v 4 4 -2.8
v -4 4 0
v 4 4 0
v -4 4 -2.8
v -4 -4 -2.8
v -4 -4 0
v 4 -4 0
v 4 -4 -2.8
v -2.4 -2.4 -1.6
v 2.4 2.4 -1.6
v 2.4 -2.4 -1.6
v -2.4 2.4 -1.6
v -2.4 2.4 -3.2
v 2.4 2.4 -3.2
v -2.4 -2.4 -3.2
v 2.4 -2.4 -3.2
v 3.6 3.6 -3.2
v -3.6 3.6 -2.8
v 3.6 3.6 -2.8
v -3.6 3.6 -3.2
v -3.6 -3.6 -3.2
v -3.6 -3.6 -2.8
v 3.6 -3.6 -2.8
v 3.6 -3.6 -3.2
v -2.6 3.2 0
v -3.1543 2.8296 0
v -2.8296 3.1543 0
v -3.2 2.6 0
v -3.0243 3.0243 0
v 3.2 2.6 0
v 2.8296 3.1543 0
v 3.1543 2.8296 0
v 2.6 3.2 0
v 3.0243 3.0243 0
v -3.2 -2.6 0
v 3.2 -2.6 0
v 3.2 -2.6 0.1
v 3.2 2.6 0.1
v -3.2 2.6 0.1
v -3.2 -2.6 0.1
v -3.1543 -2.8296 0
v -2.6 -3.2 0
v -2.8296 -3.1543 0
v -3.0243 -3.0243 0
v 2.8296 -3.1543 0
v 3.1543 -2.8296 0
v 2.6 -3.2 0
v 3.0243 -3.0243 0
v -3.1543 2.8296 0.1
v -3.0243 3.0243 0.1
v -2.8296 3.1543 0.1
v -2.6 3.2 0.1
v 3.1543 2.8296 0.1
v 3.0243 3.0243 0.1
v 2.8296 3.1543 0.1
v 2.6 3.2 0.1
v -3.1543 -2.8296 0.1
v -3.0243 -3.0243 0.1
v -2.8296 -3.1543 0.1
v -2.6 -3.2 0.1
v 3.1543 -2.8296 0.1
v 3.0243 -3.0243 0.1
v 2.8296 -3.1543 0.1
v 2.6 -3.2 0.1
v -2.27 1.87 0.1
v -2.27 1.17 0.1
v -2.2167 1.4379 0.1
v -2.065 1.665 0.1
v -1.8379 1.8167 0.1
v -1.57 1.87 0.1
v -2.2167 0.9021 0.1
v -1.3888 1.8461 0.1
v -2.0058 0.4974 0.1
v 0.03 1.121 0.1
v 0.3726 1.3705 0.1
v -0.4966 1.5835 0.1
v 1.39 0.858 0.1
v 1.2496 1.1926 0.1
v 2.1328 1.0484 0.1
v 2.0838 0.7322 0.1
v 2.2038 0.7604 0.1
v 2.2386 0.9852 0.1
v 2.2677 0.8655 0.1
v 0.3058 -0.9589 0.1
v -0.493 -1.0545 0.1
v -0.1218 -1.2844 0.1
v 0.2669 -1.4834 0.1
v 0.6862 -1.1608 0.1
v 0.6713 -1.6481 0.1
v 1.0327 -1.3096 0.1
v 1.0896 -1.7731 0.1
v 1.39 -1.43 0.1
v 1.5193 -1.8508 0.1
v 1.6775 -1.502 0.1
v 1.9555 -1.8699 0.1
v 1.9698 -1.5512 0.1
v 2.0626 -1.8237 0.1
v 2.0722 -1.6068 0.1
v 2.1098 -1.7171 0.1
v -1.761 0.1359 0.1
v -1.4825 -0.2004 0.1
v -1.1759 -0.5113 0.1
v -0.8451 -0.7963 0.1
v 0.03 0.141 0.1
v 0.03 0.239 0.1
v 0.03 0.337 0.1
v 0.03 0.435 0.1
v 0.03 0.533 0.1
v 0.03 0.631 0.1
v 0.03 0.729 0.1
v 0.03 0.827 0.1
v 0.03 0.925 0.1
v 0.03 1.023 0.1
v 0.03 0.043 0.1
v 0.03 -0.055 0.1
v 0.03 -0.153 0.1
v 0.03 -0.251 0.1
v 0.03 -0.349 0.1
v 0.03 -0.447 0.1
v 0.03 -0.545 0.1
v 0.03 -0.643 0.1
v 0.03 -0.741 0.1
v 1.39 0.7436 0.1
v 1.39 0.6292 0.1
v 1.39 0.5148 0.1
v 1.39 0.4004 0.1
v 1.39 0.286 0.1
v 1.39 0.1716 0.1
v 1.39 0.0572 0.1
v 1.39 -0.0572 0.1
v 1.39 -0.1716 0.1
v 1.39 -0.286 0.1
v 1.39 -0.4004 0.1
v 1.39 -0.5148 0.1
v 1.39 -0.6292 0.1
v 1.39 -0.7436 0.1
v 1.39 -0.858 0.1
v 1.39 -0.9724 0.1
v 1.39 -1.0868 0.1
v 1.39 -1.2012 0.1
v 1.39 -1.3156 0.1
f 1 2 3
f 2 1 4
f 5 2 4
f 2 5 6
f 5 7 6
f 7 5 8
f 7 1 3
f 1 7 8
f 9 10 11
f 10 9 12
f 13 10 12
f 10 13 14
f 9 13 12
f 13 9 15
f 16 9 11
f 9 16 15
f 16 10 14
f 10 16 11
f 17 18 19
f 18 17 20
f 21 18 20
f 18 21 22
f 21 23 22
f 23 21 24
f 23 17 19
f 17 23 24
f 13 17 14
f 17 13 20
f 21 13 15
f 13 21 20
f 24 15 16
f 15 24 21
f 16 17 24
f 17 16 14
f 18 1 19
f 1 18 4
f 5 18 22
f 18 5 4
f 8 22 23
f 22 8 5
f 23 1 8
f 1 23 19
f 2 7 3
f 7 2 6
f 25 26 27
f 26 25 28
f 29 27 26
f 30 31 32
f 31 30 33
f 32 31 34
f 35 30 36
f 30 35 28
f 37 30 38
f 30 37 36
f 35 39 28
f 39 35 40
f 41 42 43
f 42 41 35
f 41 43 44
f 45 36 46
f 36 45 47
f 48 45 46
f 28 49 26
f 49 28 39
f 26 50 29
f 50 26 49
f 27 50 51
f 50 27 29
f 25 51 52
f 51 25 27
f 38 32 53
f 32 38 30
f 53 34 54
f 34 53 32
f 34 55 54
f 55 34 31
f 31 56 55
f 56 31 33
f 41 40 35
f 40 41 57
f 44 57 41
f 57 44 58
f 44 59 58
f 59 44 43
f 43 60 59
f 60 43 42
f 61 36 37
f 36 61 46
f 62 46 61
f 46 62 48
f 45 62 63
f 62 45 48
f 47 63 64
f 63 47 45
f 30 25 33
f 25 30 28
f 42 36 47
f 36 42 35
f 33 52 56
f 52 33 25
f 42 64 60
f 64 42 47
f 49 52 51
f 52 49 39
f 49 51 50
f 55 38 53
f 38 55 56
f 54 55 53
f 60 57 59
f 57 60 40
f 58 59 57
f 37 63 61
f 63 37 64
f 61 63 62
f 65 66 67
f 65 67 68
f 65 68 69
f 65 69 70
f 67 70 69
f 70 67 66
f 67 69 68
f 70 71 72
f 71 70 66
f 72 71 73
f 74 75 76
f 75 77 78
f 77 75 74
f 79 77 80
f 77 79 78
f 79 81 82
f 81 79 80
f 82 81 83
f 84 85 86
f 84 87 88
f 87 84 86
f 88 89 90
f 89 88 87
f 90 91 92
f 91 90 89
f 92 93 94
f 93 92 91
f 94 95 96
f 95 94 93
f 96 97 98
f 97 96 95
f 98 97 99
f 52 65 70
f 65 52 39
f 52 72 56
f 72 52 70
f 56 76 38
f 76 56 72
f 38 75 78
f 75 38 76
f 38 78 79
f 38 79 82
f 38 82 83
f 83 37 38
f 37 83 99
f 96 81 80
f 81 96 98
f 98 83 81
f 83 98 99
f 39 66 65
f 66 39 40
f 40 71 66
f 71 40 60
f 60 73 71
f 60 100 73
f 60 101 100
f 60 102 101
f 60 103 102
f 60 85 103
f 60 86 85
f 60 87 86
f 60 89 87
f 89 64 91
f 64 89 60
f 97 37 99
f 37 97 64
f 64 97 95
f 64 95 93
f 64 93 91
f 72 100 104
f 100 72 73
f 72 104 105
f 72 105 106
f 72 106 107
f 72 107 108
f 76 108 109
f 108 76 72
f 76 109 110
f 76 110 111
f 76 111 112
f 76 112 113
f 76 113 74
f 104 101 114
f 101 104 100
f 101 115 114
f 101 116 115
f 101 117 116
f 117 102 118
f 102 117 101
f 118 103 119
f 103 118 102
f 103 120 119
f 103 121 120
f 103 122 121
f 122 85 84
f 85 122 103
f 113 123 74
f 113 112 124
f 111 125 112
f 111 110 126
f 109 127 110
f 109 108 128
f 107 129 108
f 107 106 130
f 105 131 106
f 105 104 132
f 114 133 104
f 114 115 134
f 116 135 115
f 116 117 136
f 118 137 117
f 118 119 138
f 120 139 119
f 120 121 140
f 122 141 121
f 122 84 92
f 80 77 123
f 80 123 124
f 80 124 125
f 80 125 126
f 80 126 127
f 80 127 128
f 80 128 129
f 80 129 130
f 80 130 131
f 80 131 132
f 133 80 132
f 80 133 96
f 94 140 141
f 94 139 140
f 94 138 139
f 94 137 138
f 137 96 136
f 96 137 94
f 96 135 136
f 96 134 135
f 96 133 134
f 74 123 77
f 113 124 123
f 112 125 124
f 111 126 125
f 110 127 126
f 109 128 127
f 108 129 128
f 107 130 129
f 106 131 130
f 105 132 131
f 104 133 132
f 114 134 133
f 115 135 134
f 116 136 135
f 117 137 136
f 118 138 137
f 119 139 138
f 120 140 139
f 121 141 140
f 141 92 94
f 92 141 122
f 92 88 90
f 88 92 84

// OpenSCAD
// file: ../p/box3u12.scad
use <../lib.scad>
function ldraw_lib__box3u12() = [
// 0 Box with 3 Parallel Faces without Any Edges
// 0 Name: box3u12.dat
// 0 Author: J.C. Tchang [tchang]
// 0 !LDRAW_ORG Primitive UPDATE 2014-02
// 0 !LICENSE Licensed under CC BY 4.0 : see CAreadme.txt
// 
// 0 BFC CERTIFY CCW
  [0,"BFC","CERTIFY"],
  [0,"BFC","CCW"],
// 
// 0 !HISTORY 2014-12-23 [PTadmin] Official Update 2014-02
// 
// 
// 4 16 -1 1 1 1 1 1 1 1 -1 -1 1 -1
  [4,16,-1,1,1,1,1,1,1,1,-1,-1,1,-1],
// 4 16 -1 1 1 -1 0 1 1 0 1 1 1 1
  [4,16,-1,1,1,-1,0,1,1,0,1,1,1,1],
// 4 16 1 1 -1 1 0 -1 -1 0 -1 -1 1 -1
  [4,16,1,1,-1,1,0,-1,-1,0,-1,-1,1,-1],
];
module ldraw_lib__box3u12(step=0, col=false, unit=2/5, alt=false, line=0.2, solid=!$preview)
    makepoly(ldraw_lib__box3u12(), step=step, col=col, unit=unit, alt=alt, line=line, solid=solid);
ldraw_lib__box3u12(line=0.2);
// file: ../p/1-4cyli.scad
use <../lib.scad>
function ldraw_lib__1_4cyli() = [
// 0 Cylinder 0.25
// 0 Name: 1-4cyli.dat
// 0 Author: James Jessiman
// 0 !LDRAW_ORG Primitive UPDATE 2012-01
// 0 !LICENSE Licensed under CC BY 4.0 : see CAreadme.txt
// 
// 0 BFC CERTIFY CCW
  [0,"BFC","CERTIFY"],
  [0,"BFC","CCW"],
// 
// 0 !HISTORY 2002-03-23 [sbliss] Added BFC statement.
// 0 !HISTORY 2002-04-25 [PTadmin] Official Update 2002-02
// 0 !HISTORY 2007-06-22 [PTadmin] Header formatted for Contributor Agreement
// 0 !HISTORY 2008-07-01 [PTadmin] Official Update 2008-01
// 0 !HISTORY 2012-02-16 [Philo] Changed to CCW
// 0 !HISTORY 2012-03-30 [PTadmin] Official Update 2012-01
// 
// 
// 4 16 1 1 0 0.9239 1 0.3827 0.9239 0 0.3827 1 0 0
  [4,16,1,1,0,0.9239,1,0.3827,0.9239,0,0.3827,1,0,0],
// 5 24 1 0 0 1 1 0 0.9239 0 0.3827 1 0 -1
  [5,24,1,0,0,1,1,0,0.9239,0,0.3827,1,0,-1],
// 4 16 0.9239 1 0.3827 0.7071 1 0.7071 0.7071 0 0.7071 0.9239 0 0.3827
  [4,16,0.9239,1,0.3827,0.7071,1,0.7071,0.7071,0,0.7071,0.9239,0,0.3827],
// 5 24 0.9239 0 0.3827 0.9239 1 0.3827 0.7071 0 0.7071 1 0 0
  [5,24,0.9239,0,0.3827,0.9239,1,0.3827,0.7071,0,0.7071,1,0,0],
// 4 16 0.7071 1 0.7071 0.3827 1 0.9239 0.3827 0 0.9239 0.7071 0 0.7071
  [4,16,0.7071,1,0.7071,0.3827,1,0.9239,0.3827,0,0.9239,0.7071,0,0.7071],
// 5 24 0.7071 0 0.7071 0.7071 1 0.7071 0.3827 0 0.9239 0.9239 0 0.3827
  [5,24,0.7071,0,0.7071,0.7071,1,0.7071,0.3827,0,0.9239,0.9239,0,0.3827],
// 4 16 0.3827 1 0.9239 0 1 1 0 0 1 0.3827 0 0.9239
  [4,16,0.3827,1,0.9239,0,1,1,0,0,1,0.3827,0,0.9239],
// 5 24 0.3827 0 0.9239 0.3827 1 0.9239 0 0 1 0.7071 0 0.7071
  [5,24,0.3827,0,0.9239,0.3827,1,0.9239,0,0,1,0.7071,0,0.7071],
// 5 24 0 0 1 0 1 1 0.3827 0 0.9239 -1 0 1
  [5,24,0,0,1,0,1,1,0.3827,0,0.9239,-1,0,1],
];
module ldraw_lib__1_4cyli(step=0, col=false, unit=2/5, alt=false, line=0.2, solid=!$preview)
    makepoly(ldraw_lib__1_4cyli(), step=step, col=col, unit=unit, alt=alt, line=line, solid=solid);
ldraw_lib__1_4cyli(line=0.2);
// file: ../p/box5.scad
use <../lib.scad>
function ldraw_lib__box5() = [
// 0 Box with 5 Faces and All Edges
// 0 Name: box5.dat
// 0 Author: James Jessiman
// 0 !LDRAW_ORG Primitive UPDATE 2012-01
// 0 !LICENSE Licensed under CC BY 4.0 : see CAreadme.txt
// 
// 0 BFC CERTIFY CCW
  [0,"BFC","CERTIFY"],
  [0,"BFC","CCW"],
// 
// 0 !HISTORY 2002-04-03 [sbliss] Modified for BFC compliance
// 0 !HISTORY 2002-04-25 [PTadmin] Official Update 2002-02
// 0 !HISTORY 2007-06-24 [PTadmin] Header formatted for Contributor Agreement
// 0 !HISTORY 2008-07-01 [PTadmin] Official Update 2008-01
// 0 !HISTORY 2012-02-16 [Philo] Changed to CCW
// 0 !HISTORY 2012-03-30 [PTadmin] Official Update 2012-01
// 
// 
// 2 24 1 1 1 -1 1 1
  [2,24,1,1,1,-1,1,1],
// 2 24 -1 1 1 -1 1 -1
  [2,24,-1,1,1,-1,1,-1],
// 2 24 -1 1 -1 1 1 -1
  [2,24,-1,1,-1,1,1,-1],
// 2 24 1 1 -1 1 1 1
  [2,24,1,1,-1,1,1,1],
// 2 24 1 0 1 -1 0 1
  [2,24,1,0,1,-1,0,1],
// 2 24 -1 0 1 -1 0 -1
  [2,24,-1,0,1,-1,0,-1],
// 2 24 -1 0 -1 1 0 -1
  [2,24,-1,0,-1,1,0,-1],
// 2 24 1 0 -1 1 0 1
  [2,24,1,0,-1,1,0,1],
// 2 24 1 0 1 1 1 1
  [2,24,1,0,1,1,1,1],
// 2 24 -1 0 1 -1 1 1
  [2,24,-1,0,1,-1,1,1],
// 2 24 1 0 -1 1 1 -1
  [2,24,1,0,-1,1,1,-1],
// 2 24 -1 0 -1 -1 1 -1
  [2,24,-1,0,-1,-1,1,-1],
// 4 16 -1 1 1 1 1 1 1 1 -1 -1 1 -1
  [4,16,-1,1,1,1,1,1,1,1,-1,-1,1,-1],
// 4 16 -1 1 1 -1 0 1 1 0 1 1 1 1
  [4,16,-1,1,1,-1,0,1,1,0,1,1,1,1],
// 4 16 -1 1 -1 -1 0 -1 -1 0 1 -1 1 1
  [4,16,-1,1,-1,-1,0,-1,-1,0,1,-1,1,1],
// 4 16 1 1 -1 1 0 -1 -1 0 -1 -1 1 -1
  [4,16,1,1,-1,1,0,-1,-1,0,-1,-1,1,-1],
// 4 16 1 1 1 1 0 1 1 0 -1 1 1 -1
  [4,16,1,1,1,1,0,1,1,0,-1,1,1,-1],
];
module ldraw_lib__box5(step=0, col=false, unit=2/5, alt=false, line=0.2, solid=!$preview)
    makepoly(ldraw_lib__box5(), step=step, col=col, unit=unit, alt=alt, line=line, solid=solid);
ldraw_lib__box5(line=0.2);
// file: ../p/box4.scad
use <../lib.scad>
function ldraw_lib__box4() = [
// 0 Box with 4 Faces (2 Parallel Pairs) and All Edges
// 0 Name: box4.dat
// 0 Author: James Jessiman
// 0 !LDRAW_ORG Primitive UPDATE 2012-01
// 0 !LICENSE Licensed under CC BY 4.0 : see CAreadme.txt
// 
// 0 BFC CERTIFY CCW
  [0,"BFC","CERTIFY"],
  [0,"BFC","CCW"],
// 
// 0 !HISTORY 2002-04-03 [sbliss] Modified for BFC compliance
// 0 !HISTORY 2002-04-25 [PTadmin] Official Update 2002-02
// 0 !HISTORY 2007-06-24 [PTadmin] Header formatted for Contributor Agreement
// 0 !HISTORY 2008-07-01 [PTadmin] Official Update 2008-01
// 0 !HISTORY 2012-02-16 [Philo] Changed to CCW
// 0 !HISTORY 2012-03-30 [PTadmin] Official Update 2012-01
// 
// 
// 2 24 1 1 1 -1 1 1
  [2,24,1,1,1,-1,1,1],
// 2 24 -1 1 1 -1 1 -1
  [2,24,-1,1,1,-1,1,-1],
// 2 24 -1 1 -1 1 1 -1
  [2,24,-1,1,-1,1,1,-1],
// 2 24 1 1 -1 1 1 1
  [2,24,1,1,-1,1,1,1],
// 2 24 1 0 1 -1 0 1
  [2,24,1,0,1,-1,0,1],
// 2 24 -1 0 1 -1 0 -1
  [2,24,-1,0,1,-1,0,-1],
// 2 24 -1 0 -1 1 0 -1
  [2,24,-1,0,-1,1,0,-1],
// 2 24 1 0 -1 1 0 1
  [2,24,1,0,-1,1,0,1],
// 2 24 1 0 1 1 1 1
  [2,24,1,0,1,1,1,1],
// 2 24 -1 0 1 -1 1 1
  [2,24,-1,0,1,-1,1,1],
// 2 24 1 0 -1 1 1 -1
  [2,24,1,0,-1,1,1,-1],
// 2 24 -1 0 -1 -1 1 -1
  [2,24,-1,0,-1,-1,1,-1],
// 4 16 -1 1 1 -1 0 1 1 0 1 1 1 1
  [4,16,-1,1,1,-1,0,1,1,0,1,1,1,1],
// 4 16 -1 1 -1 -1 0 -1 -1 0 1 -1 1 1
  [4,16,-1,1,-1,-1,0,-1,-1,0,1,-1,1,1],
// 4 16 1 1 -1 1 0 -1 -1 0 -1 -1 1 -1
  [4,16,1,1,-1,1,0,-1,-1,0,-1,-1,1,-1],
// 4 16 1 1 1 1 0 1 1 0 -1 1 1 -1
  [4,16,1,1,1,1,0,1,1,0,-1,1,1,-1],
];
module ldraw_lib__box4(step=0, col=false, unit=2/5, alt=false, line=0.2, solid=!$preview)
    makepoly(ldraw_lib__box4(), step=step, col=col, unit=unit, alt=alt, line=line, solid=solid);
ldraw_lib__box4(line=0.2);
// file: s/stickerback008x008.scad
use <../../lib.scad>
use <../../p/1-4chrd.scad>
use <../../p/1-4cyli.scad>
use <../../p/box3u12.scad>
function ldraw_lib__s__stickerback008x008() = [
// 0 ~Sticker Back  0.8 x  0.8
// 0 Name: s\stickerback008x008.dat
// 0 Author: Massimo Maso [Sirio]
// 0 !LDRAW_ORG Subpart UPDATE 2025-08
// 0 !LICENSE Licensed under CC BY 4.0 : see CAreadme.txt
// 
// 0 BFC CERTIFY CCW
  [0,"BFC","CERTIFY"],
  [0,"BFC","CCW"],
// 
// 0 !HISTORY 2025-08-31 [OrionP] Official Update 2025-08
// 
// 0 // Primitives
// 1 16 -6.5 0 6.5 -1.5 0 0 0 -1 0 0 0 1.5 1-4chrd.dat
  [1,16,-6.5,0,6.5,-1.5,0,0,0,-1,0,0,0,1.5, ldraw_lib__1_4chrd()],
// 1 16 6.5 0 6.5 1.5 0 0 0 -1 0 0 0 1.5 1-4chrd.dat
  [1,16,6.5,0,6.5,1.5,0,0,0,-1,0,0,0,1.5, ldraw_lib__1_4chrd()],
// 1 16 0 -.25 0 0 0 8 0 .25 0 6.5 0 0 box3u12.dat
  [1,16,0,-.25,0,0,0,8,0,.25,0,6.5,0,0, ldraw_lib__box3u12()],
// 1 16 -6.5 0 -6.5 -1.5 0 0 0 -1 0 0 0 -1.5 1-4chrd.dat
  [1,16,-6.5,0,-6.5,-1.5,0,0,0,-1,0,0,0,-1.5, ldraw_lib__1_4chrd()],
// 1 16 6.5 0 -6.5 1.5 0 0 0 -1 0 0 0 -1.5 1-4chrd.dat
  [1,16,6.5,0,-6.5,1.5,0,0,0,-1,0,0,0,-1.5, ldraw_lib__1_4chrd()],
// 1 16 -6.5 0 6.5 -1.5 0 0 0 -.25 0 0 0 1.5 1-4cyli.dat
  [1,16,-6.5,0,6.5,-1.5,0,0,0,-.25,0,0,0,1.5, ldraw_lib__1_4cyli()],
// 1 16 6.5 0 6.5 1.5 0 0 0 -.25 0 0 0 1.5 1-4cyli.dat
  [1,16,6.5,0,6.5,1.5,0,0,0,-.25,0,0,0,1.5, ldraw_lib__1_4cyli()],
// 1 16 -6.5 0 -6.5 -1.5 0 0 0 -.25 0 0 0 -1.5 1-4cyli.dat
  [1,16,-6.5,0,-6.5,-1.5,0,0,0,-.25,0,0,0,-1.5, ldraw_lib__1_4cyli()],
// 1 16 6.5 0 -6.5 1.5 0 0 0 -.25 0 0 0 -1.5 1-4cyli.dat
  [1,16,6.5,0,-6.5,1.5,0,0,0,-.25,0,0,0,-1.5, ldraw_lib__1_4cyli()],
// 0 // Bottom faces
// 4 16 -8 0 6.5 -6.5 0 8 6.5 0 8 8 0 6.5
  [4,16,-8,0,6.5,-6.5,0,8,6.5,0,8,8,0,6.5],
// 4 16 -8 0 -6.5 8 0 -6.5 6.5 0 -8 -6.5 0 -8
  [4,16,-8,0,-6.5,8,0,-6.5,6.5,0,-8,-6.5,0,-8],
// 0 // Lateral faces
// 4 16 -6.5 0 8 -6.5 -.25 8 6.5 -.25 8 6.5 0 8
  [4,16,-6.5,0,8,-6.5,-.25,8,6.5,-.25,8,6.5,0,8],
// 4 16 -6.5 0 -8 6.5 0 -8 6.5 -.25 -8 -6.5 -.25 -8
  [4,16,-6.5,0,-8,6.5,0,-8,6.5,-.25,-8,-6.5,-.25,-8],
];
module ldraw_lib__s__stickerback008x008(step=0, col=false, unit=2/5, alt=false, line=0.2, solid=!$preview)
    makepoly(ldraw_lib__s__stickerback008x008(), step=step, col=col, unit=unit, alt=alt, line=line, solid=solid);
ldraw_lib__s__stickerback008x008(line=0.2);
// file: ../p/1-4ndis.scad
use <../lib.scad>
function ldraw_lib__1_4ndis() = [
// 0 Disc Negative 0.25
// 0 Name: 1-4ndis.dat
// 0 Author: James Jessiman
// 0 !LDRAW_ORG Primitive UPDATE 2012-01
// 0 !LICENSE Licensed under CC BY 4.0 : see CAreadme.txt
// 
// 0 BFC CERTIFY CCW
  [0,"BFC","CERTIFY"],
  [0,"BFC","CCW"],
// 
// 0 !HISTORY 2002-03-23 [sbliss] Added BFC Statement
// 0 !HISTORY 2002-04-25 [PTadmin] Official Update 2002-02
// 0 !HISTORY 2007-06-22 [PTadmin] Header formatted for Contributor Agreement
// 0 !HISTORY 2008-07-01 [PTadmin] Official Update 2008-01
// 0 !HISTORY 2012-02-16 [Philo] Changed to CCW
// 0 !HISTORY 2012-03-30 [PTadmin] Official Update 2012-01
// 
// 
// 3 16 0.9239 0 0.3827 1 0 0 1 0 1
  [3,16,0.9239,0,0.3827,1,0,0,1,0,1],
// 3 16 0.7071 0 0.7071 0.9239 0 0.3827 1 0 1
  [3,16,0.7071,0,0.7071,0.9239,0,0.3827,1,0,1],
// 3 16 0.3827 0 0.9239 0.7071 0 0.7071 1 0 1
  [3,16,0.3827,0,0.9239,0.7071,0,0.7071,1,0,1],
// 3 16 0 0 1 0.3827 0 0.9239 1 0 1
  [3,16,0,0,1,0.3827,0,0.9239,1,0,1],
];
module ldraw_lib__1_4ndis(step=0, col=false, unit=2/5, alt=false, line=0.2, solid=!$preview)
    makepoly(ldraw_lib__1_4ndis(), step=step, col=col, unit=unit, alt=alt, line=line, solid=solid);
ldraw_lib__1_4ndis(line=0.2);
// file: ../p/1-4chrd.scad
use <../lib.scad>
function ldraw_lib__1_4chrd() = [
// 0 Chord 0.25
// 0 Name: 1-4chrd.dat
// 0 Author: Max Martin Richter [MMR1988]
// 0 !LDRAW_ORG Primitive UPDATE 2023-05
// 0 !LICENSE Licensed under CC BY 4.0 : see CAreadme.txt
// 
// 0 BFC CERTIFY CCW
  [0,"BFC","CERTIFY"],
  [0,"BFC","CCW"],
// 
// 0 !HISTORY 2004-04-22 [PTadmin] Official Update 2004-02
// 0 !HISTORY 2007-10-09 [PTadmin] Header formatted for Contributor Agreement
// 0 !HISTORY 2008-07-01 [PTadmin] Official Update 2008-01
// 0 !HISTORY 2012-08-02 [MMR1988] Re-creation with PrimGen2 and Rectifier
// 0 !HISTORY 2012-08-09 [PTadmin] Official Update 2012-02
// 0 !HISTORY 2023-10-27 [OrionP] Change author to MMR1988 from hafhead
// 0 !HISTORY 2023-10-31 [OrionP] Official Update 2023-05
// 
// 4 16 0.9239 0 0.3827 0.3827 0 0.9239 0 0 1 1 0 0
  [4,16,0.9239,0,0.3827,0.3827,0,0.9239,0,0,1,1,0,0],
// 3 16 0.7071 0 0.7071 0.3827 0 0.9239 0.9239 0 0.3827
  [3,16,0.7071,0,0.7071,0.3827,0,0.9239,0.9239,0,0.3827],
];
module ldraw_lib__1_4chrd(step=0, col=false, unit=2/5, alt=false, line=0.2, solid=!$preview)
    makepoly(ldraw_lib__1_4chrd(), step=step, col=col, unit=unit, alt=alt, line=line, solid=solid);
ldraw_lib__1_4chrd(line=0.2);
// file: s/3070bs01.scad
use <../../lib.scad>
use <../../p/box4.scad>
use <../../p/box5.scad>
function ldraw_lib__s__3070bs01() = [
// 0 ~Tile  1 x  1 with Groove without Top Face
// 0 Name: s\3070bs01.dat
// 0 Author: Chris Dee [cwdee]
// 0 !LDRAW_ORG Subpart UPDATE 2009-02
// 0 !LICENSE Licensed under CC BY 4.0 : see CAreadme.txt
// 
// 0 BFC CERTIFY CCW
  [0,"BFC","CERTIFY"],
  [0,"BFC","CCW"],
// 
// 0 !HISTORY 2009-09-03 [PTadmin] Official Update 2009-02
// 
// 
// 1 16 0 0 0 10 0 0 0 7 0 0 0 10 box4.dat
  [1,16,0,0,0,10,0,0,0,7,0,0,0,10, ldraw_lib__box4()],
// 0 BFC INVERTNEXT
  [0,"BFC","INVERTNEXT"],
// 1 16 0 8 0 6 0 0 0 -4 0 0 0 6 box5.dat
  [1,16,0,8,0,6,0,0,0,-4,0,0,0,6, ldraw_lib__box5()],
// 1 16 0 7 0 9 0 0 0 1 0 0 0 9 box4.dat
  [1,16,0,7,0,9,0,0,0,1,0,0,0,9, ldraw_lib__box4()],
// 
// 4 16 9 8 9 6 8 6 -6 8 6 -9 8 9
  [4,16,9,8,9,6,8,6,-6,8,6,-9,8,9],
// 4 16 -9 8 9 -6 8 6 -6 8 -6 -9 8 -9
  [4,16,-9,8,9,-6,8,6,-6,8,-6,-9,8,-9],
// 4 16 -9 8 -9 -6 8 -6 6 8 -6 9 8 -9
  [4,16,-9,8,-9,-6,8,-6,6,8,-6,9,8,-9],
// 4 16 9 8 -9 6 8 -6 6 8 6 9 8 9
  [4,16,9,8,-9,6,8,-6,6,8,6,9,8,9],
// 
// 4 16 10 7 10 9 7 9 -9 7 9 -10 7 10
  [4,16,10,7,10,9,7,9,-9,7,9,-10,7,10],
// 4 16 -10 7 10 -9 7 9 -9 7 -9 -10 7 -10
  [4,16,-10,7,10,-9,7,9,-9,7,-9,-10,7,-10],
// 4 16 -10 7 -10 -9 7 -9 9 7 -9 10 7 -10
  [4,16,-10,7,-10,-9,7,-9,9,7,-9,10,7,-10],
// 4 16 10 7 -10 9 7 -9 9 7 9 10 7 10
  [4,16,10,7,-10,9,7,-9,9,7,9,10,7,10],
// 0
];
module ldraw_lib__s__3070bs01(step=0, col=false, unit=2/5, alt=false, line=0.2, solid=!$preview)
    makepoly(ldraw_lib__s__3070bs01(), step=step, col=col, unit=unit, alt=alt, line=line, solid=solid);
ldraw_lib__s__3070bs01(line=0.2);
// file: 3070b.scad
use <../lib.scad>
use <s/3070bs01.scad>
function ldraw_lib__3070b() = [
// 0 Tile  1 x  1 with Groove
// 0 Name: 3070b.dat
// 0 Author: Chris Dee [cwdee]
// 0 !LDRAW_ORG Part UPDATE 2025-09
// 0 !LICENSE Licensed under CC BY 4.0 : see CAreadme.txt
// 
// 0 BFC CERTIFY CCW
  [0,"BFC","CERTIFY"],
  [0,"BFC","CCW"],
// 
// 0 !KEYWORDS BrickLink 3070
// 
// 0 !HISTORY 2009-09-03 [PTadmin] Official Update 2009-02
// 0 !HISTORY 2025-09-27 [OrionP] Changed winding to CCW
// 0 !HISTORY 2025-09-29 [OrionP] Official Update 2025-09
// 
// 1 16 0 0 0 1 0 0 0 1 0 0 0 1 s\3070bs01.dat
  [1,16,0,0,0,1,0,0,0,1,0,0,0,1, ldraw_lib__s__3070bs01()],
// 4 16 -10 0 10 -10 0 -10 10 0 -10 10 0 10
  [4,16,-10,0,10,-10,0,-10,10,0,-10,10,0,10],
// 0
];
module ldraw_lib__3070b(step=0, col=false, unit=2/5, alt=false, line=0.2, solid=!$preview)
    makepoly(ldraw_lib__3070b(), step=step, col=col, unit=unit, alt=alt, line=line, solid=solid);
ldraw_lib__3070b(line=0.2);
// main file
use <../lib.scad>
use <3070b.scad>
use <6177960g.scad>
function ldraw_lib__3070bd0a() = [
// 0 Tile  1 x  1 with Black Air Vent on Orange Background Right Sticker
// 0 Name: 3070bd0a.dat
// 0 Author: Vincent Messenet [Cheenzo]
// 0 !LDRAW_ORG Shortcut UPDATE 2026-06
// 0 !LICENSE Licensed under CC BY 4.0 : see CAreadme.txt
// 
// 0 BFC CERTIFY CCW
  [0,"BFC","CERTIFY"],
  [0,"BFC","CCW"],
// 
// 0 !CATEGORY Sticker Shortcut
// 
// 0 !KEYWORDS 720S, Bricklink 3070pb360R, McLaren, Set 75880, Speed Champions
// 
// 0 !HISTORY 2026-06-28 [OrionP] Official Update 2026-06
// 
// 1 16 0 0 0 1 0 0 0 1 0 0 0 1 3070b.dat
  [1,16,0,0,0,1,0,0,0,1,0,0,0,1, ldraw_lib__3070b()],
// 1 16 0 0 0 1 0 0 0 1 0 0 0 1 6177960g.dat
  [1,16,0,0,0,1,0,0,0,1,0,0,0,1, ldraw_lib__6177960g()],
];
module ldraw_lib__3070bd0a(step=0, col=false, unit=2/5, alt=false, line=0.2, solid=!$preview)
    makepoly(ldraw_lib__3070bd0a(), step=step, col=col, unit=unit, alt=alt, line=line, solid=solid);
ldraw_lib__3070bd0a(line=0.2);
